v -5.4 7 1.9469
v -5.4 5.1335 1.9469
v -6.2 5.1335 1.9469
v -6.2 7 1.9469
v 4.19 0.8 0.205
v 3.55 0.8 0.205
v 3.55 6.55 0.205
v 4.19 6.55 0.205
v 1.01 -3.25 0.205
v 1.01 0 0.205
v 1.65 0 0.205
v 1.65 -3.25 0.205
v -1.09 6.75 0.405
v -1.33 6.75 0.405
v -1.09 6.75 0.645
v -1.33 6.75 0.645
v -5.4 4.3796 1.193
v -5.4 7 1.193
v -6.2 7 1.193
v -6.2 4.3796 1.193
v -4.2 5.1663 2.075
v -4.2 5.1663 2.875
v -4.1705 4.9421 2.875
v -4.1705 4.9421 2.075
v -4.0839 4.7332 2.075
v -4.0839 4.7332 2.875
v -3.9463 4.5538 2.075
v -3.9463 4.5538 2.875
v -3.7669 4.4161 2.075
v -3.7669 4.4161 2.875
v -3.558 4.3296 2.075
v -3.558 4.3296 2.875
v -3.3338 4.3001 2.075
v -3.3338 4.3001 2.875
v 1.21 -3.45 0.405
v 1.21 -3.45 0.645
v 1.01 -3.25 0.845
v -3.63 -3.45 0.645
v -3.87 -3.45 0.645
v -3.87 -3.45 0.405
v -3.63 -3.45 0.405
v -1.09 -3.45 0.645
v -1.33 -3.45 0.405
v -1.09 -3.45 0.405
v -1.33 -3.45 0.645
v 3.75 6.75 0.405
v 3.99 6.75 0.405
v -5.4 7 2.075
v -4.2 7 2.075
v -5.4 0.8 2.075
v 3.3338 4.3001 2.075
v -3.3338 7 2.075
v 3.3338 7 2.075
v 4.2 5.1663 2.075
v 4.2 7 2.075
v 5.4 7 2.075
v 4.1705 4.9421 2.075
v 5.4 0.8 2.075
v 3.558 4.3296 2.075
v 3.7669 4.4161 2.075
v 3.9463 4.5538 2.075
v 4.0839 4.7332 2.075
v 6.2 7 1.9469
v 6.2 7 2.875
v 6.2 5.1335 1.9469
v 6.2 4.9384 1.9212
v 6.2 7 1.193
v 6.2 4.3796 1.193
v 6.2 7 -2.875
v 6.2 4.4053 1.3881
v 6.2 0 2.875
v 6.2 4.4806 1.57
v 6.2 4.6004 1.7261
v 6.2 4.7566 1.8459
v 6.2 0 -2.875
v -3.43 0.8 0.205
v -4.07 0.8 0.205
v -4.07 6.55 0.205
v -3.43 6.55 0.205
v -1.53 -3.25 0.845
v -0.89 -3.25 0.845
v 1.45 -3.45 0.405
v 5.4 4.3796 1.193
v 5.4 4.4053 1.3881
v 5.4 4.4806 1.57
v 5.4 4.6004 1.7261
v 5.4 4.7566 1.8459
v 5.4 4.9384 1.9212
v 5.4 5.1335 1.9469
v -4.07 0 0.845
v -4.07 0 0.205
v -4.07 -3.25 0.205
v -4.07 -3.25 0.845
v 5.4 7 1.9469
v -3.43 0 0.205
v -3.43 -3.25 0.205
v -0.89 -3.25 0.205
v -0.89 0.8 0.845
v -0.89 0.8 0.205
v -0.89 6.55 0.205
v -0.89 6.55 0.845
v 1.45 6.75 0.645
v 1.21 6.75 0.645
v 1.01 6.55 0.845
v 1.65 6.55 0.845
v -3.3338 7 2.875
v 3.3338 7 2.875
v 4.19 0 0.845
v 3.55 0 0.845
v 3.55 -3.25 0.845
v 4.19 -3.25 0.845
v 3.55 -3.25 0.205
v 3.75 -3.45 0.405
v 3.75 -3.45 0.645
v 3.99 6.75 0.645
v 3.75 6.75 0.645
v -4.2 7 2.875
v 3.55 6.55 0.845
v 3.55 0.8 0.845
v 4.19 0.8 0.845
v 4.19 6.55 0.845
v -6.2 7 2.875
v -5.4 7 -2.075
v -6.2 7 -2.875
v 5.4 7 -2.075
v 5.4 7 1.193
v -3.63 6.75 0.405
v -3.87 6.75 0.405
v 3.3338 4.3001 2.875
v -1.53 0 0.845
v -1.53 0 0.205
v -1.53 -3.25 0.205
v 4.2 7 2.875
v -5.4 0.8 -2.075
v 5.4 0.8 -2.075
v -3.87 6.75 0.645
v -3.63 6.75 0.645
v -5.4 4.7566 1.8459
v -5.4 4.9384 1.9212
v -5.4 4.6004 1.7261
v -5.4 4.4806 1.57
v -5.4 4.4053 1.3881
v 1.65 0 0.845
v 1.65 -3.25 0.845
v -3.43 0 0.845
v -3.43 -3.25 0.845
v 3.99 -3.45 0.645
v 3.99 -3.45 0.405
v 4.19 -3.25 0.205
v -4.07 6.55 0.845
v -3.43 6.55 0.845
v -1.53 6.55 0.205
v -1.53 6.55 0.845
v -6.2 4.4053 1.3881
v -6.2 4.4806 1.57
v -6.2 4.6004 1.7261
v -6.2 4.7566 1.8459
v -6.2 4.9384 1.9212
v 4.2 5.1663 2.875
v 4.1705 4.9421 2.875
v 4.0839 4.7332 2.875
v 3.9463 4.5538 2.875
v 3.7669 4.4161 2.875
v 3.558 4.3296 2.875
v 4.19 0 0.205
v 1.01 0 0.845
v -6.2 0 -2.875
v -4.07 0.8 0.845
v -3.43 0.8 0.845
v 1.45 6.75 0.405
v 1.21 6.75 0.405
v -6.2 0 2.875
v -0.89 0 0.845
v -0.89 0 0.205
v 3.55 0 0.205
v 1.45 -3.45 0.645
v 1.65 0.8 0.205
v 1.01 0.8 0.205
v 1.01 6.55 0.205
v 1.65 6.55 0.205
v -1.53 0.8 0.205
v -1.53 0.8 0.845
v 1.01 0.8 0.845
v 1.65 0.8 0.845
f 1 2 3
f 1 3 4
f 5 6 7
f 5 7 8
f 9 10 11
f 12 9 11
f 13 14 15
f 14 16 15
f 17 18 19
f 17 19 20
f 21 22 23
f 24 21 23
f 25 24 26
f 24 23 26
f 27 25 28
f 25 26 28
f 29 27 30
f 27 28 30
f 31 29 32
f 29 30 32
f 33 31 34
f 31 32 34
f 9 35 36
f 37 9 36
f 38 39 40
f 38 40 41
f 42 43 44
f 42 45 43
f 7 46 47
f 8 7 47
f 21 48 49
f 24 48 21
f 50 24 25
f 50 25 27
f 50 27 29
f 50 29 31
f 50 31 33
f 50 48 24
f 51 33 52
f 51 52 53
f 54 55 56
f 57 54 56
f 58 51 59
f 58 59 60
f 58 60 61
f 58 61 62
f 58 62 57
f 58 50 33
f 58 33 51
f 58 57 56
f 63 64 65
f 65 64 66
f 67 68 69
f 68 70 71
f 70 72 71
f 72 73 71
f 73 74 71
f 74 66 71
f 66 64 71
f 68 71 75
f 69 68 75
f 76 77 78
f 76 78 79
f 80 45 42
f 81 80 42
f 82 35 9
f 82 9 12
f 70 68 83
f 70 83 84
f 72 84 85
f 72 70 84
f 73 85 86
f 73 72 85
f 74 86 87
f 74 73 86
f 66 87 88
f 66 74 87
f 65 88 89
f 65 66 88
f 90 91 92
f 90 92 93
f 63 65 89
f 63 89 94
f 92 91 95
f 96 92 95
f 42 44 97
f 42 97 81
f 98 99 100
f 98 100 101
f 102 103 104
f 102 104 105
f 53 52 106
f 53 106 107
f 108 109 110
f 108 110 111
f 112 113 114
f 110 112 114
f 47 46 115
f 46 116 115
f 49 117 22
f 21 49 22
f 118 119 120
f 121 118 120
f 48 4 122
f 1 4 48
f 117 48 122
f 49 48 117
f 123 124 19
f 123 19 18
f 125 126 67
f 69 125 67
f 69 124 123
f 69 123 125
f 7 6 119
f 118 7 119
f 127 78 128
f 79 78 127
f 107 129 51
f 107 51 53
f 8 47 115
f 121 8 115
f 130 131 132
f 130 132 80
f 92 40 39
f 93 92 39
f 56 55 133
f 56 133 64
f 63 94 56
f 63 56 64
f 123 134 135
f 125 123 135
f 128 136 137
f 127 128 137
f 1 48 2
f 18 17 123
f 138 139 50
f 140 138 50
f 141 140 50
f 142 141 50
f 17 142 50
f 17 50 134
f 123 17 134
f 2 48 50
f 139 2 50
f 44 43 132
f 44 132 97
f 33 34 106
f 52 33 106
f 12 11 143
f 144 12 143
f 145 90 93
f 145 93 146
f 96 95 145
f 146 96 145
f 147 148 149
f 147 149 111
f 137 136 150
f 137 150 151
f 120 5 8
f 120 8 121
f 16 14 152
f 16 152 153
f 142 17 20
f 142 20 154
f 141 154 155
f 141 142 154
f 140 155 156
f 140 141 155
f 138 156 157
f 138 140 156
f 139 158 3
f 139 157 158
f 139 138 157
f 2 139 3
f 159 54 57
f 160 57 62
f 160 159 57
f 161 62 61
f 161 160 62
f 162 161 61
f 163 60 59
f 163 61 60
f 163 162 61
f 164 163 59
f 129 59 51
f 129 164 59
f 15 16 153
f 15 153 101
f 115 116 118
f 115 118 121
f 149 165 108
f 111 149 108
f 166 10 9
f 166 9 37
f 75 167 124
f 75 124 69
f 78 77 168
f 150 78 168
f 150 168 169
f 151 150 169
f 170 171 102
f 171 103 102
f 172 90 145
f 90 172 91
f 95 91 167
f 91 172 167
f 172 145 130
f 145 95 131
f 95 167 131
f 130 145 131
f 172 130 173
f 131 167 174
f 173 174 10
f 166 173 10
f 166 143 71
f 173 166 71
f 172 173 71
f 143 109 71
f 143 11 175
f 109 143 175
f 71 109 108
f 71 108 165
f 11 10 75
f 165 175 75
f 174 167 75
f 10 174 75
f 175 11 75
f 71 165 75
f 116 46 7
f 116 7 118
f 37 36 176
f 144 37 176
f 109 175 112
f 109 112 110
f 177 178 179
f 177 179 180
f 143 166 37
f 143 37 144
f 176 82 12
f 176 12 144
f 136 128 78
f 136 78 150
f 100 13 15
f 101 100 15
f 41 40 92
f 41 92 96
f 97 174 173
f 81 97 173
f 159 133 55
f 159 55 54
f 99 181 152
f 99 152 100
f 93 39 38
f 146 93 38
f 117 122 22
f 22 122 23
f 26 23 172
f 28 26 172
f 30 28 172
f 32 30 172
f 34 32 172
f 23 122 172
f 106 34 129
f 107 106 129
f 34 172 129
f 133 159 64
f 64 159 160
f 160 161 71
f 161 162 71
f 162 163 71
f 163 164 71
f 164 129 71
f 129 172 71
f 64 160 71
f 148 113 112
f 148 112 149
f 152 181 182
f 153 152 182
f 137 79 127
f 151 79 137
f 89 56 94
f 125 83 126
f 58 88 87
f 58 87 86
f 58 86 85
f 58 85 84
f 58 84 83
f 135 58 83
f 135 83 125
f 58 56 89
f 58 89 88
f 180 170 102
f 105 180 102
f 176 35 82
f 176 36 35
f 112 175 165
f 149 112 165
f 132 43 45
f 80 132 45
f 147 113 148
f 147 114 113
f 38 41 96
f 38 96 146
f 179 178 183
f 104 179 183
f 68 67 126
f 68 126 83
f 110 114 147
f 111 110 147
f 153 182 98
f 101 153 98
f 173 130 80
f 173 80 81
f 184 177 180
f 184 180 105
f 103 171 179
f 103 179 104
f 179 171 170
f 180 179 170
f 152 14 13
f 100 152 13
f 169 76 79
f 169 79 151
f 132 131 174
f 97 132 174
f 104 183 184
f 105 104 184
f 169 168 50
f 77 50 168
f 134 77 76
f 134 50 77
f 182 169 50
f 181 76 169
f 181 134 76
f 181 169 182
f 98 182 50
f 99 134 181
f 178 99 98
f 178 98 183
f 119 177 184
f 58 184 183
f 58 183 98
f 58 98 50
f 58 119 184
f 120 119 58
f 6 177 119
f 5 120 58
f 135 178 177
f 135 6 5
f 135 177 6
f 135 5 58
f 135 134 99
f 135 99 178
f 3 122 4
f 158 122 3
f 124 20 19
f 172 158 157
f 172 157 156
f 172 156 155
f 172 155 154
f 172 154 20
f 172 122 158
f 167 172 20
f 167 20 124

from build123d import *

# Parameters (mm, degrees)
SKETCH1_W                = 12.4
SKETCH1_H                = 5.75
BOSS_EXTRUDE1_DEPTH      = 7
SHELL1_T                 = -0.8
CUT_EXTRUDE1_DEPTH       = 13.4
CUT_EXTRUDE2_REACH       = 7.75
SKETCH4_W                = 0.64
SKETCH4_H                = 0.64
BOSS_EXTRUDE2_DEPTH      = 3.45
BOSS_EXTRUDE2_DEPTH_BACK = 6.75
CHAMFER1_SIZE            = 0.2


with BuildPart() as part:
    # Sketch1 → Boss-Extrude1 (new body)
    with BuildSketch(Plane(origin=(0, 0, 0), x_dir=(1, 0, 0), z_dir=(0, 1, 0))):
        Rectangle(SKETCH1_W, SKETCH1_H)
    extrude(amount=BOSS_EXTRUDE1_DEPTH)

    # Shell1
    shell1_openings = [part.faces().sort_by_distance(p)[0] for p in [
        (0, 7, 0),
    ]]
    offset(amount=SHELL1_T, openings=shell1_openings, kind=Kind.INTERSECTION)

    # Sketch2 → Cut-Extrude1 (cut, through all)
    with BuildSketch(Plane(origin=(6.2, 0, 0), x_dir=(0, 0, -1), z_dir=(1, 0, 0))):
        with BuildLine():
            Line((-1.19301282, 7), (-1.19301282, 4.379603984))
            ThreePointArc((-1.19301282, 4.379603984), (-1.72610374, 4.600417472), (-1.946917229, 5.133508392))
            Line((-1.946917229, 5.133508392), (-1.946917229, 7))
            Line((-1.946917229, 7), (-1.19301282, 7))
        make_face()
    extrude(amount=-CUT_EXTRUDE1_DEPTH, mode=Mode.SUBTRACT)

    # Sketch3 → Cut-Extrude2 (cut, up to next)
    with BuildSketch(Plane.XY.offset(2.875), mode=Mode.PRIVATE) as cut_extrude2_sk1:
        with BuildLine():
            Line((-4.2, 7), (-4.2, 6.728922615))
            Line((-4.2, 6.728922615), (-4.2, 5.166308225))
            ThreePointArc((-4.2, 5.166308225), (-3.946286554, 4.553789782), (-3.33376811, 4.300076336))
            Line((-3.33376811, 4.300076336), (-3.33376811, 7))
            Line((-3.33376811, 7), (-4.2, 7))
        make_face()
    cut_extrude2_tool1 = extrude(cut_extrude2_sk1.sketch, amount=-CUT_EXTRUDE2_REACH, mode=Mode.PRIVATE) & part.part
    add(cut_extrude2_tool1.solids().sort_by_distance((-3.749165, 5.735551, 2.875))[0], mode=Mode.SUBTRACT)
    # Sketch3 → Cut-Extrude2 (cut, up to next)
    with BuildSketch(Plane.XY.offset(2.875), mode=Mode.PRIVATE) as cut_extrude2_sk2:
        with BuildLine():
            Line((3.33376811, 7), (4.2, 7))
            Line((4.2, 7), (4.2, 6.728922615))
            Line((4.2, 6.728922615), (4.2, 5.166308225))
            ThreePointArc((4.2, 5.166308225), (3.946286554, 4.553789782), (3.33376811, 4.300076336))
            Line((3.33376811, 4.300076336), (3.33376811, 7))
        make_face()
    cut_extrude2_tool2 = extrude(cut_extrude2_sk2.sketch, amount=-CUT_EXTRUDE2_REACH, mode=Mode.PRIVATE) & part.part
    add(cut_extrude2_tool2.solids().sort_by_distance((3.749165, 5.735551, 2.875))[0], mode=Mode.SUBTRACT)

    # Sketch4 → Boss-Extrude2 (add, two sides)
    with BuildSketch(Plane.XZ) as boss_extrude2_sk:
        with Locations((-3.75, 0.525)):
            Rectangle(SKETCH4_W, SKETCH4_H)
        with Locations((-1.21, 0.525)):
            Rectangle(SKETCH4_W, SKETCH4_H)
        with Locations((1.33, 0.525)):
            Rectangle(SKETCH4_W, SKETCH4_H)
        with Locations((3.87, 0.525)):
            Rectangle(SKETCH4_W, SKETCH4_H)
    extrude(amount=BOSS_EXTRUDE2_DEPTH)
    extrude(boss_extrude2_sk.sketch, amount=-BOSS_EXTRUDE2_DEPTH_BACK)

    # Chamfer1
    chamfer1_edges = [part.edges().sort_by_distance(p)[0] for p in [
        (-1.21, 6.75, 0.205),
        (-1.53, 6.75, 0.525),
        (-1.21, 6.75, 0.845),
        (-0.89, 6.75, 0.525),
        (-1.21, -3.45, 0.205),
        (-0.89, -3.45, 0.525),
        (-1.21, -3.45, 0.845),
        (-1.53, -3.45, 0.525),
        (1.33, 6.75, 0.205),
        (1.01, 6.75, 0.525),
        (1.33, 6.75, 0.845),
        (1.65, 6.75, 0.525),
        (1.33, -3.45, 0.205),
        (1.65, -3.45, 0.525),
        (1.33, -3.45, 0.845),
        (1.01, -3.45, 0.525),
        (3.87, 6.75, 0.205),
        (3.55, 6.75, 0.525),
        (3.87, 6.75, 0.845),
        (4.19, 6.75, 0.525),
        (3.87, -3.45, 0.205),
        (4.19, -3.45, 0.525),
        (3.87, -3.45, 0.845),
        (3.55, -3.45, 0.525),
        (-3.43, 6.75, 0.525),
        (-3.75, 6.75, 0.205),
        (-4.07, 6.75, 0.525),
        (-3.75, 6.75, 0.845),
        (-3.43, -3.45, 0.525),
        (-3.75, -3.45, 0.845),
        (-4.07, -3.45, 0.525),
        (-3.75, -3.45, 0.205),
    ]]
    chamfer(chamfer1_edges, length=CHAMFER1_SIZE)


solid = part.part
